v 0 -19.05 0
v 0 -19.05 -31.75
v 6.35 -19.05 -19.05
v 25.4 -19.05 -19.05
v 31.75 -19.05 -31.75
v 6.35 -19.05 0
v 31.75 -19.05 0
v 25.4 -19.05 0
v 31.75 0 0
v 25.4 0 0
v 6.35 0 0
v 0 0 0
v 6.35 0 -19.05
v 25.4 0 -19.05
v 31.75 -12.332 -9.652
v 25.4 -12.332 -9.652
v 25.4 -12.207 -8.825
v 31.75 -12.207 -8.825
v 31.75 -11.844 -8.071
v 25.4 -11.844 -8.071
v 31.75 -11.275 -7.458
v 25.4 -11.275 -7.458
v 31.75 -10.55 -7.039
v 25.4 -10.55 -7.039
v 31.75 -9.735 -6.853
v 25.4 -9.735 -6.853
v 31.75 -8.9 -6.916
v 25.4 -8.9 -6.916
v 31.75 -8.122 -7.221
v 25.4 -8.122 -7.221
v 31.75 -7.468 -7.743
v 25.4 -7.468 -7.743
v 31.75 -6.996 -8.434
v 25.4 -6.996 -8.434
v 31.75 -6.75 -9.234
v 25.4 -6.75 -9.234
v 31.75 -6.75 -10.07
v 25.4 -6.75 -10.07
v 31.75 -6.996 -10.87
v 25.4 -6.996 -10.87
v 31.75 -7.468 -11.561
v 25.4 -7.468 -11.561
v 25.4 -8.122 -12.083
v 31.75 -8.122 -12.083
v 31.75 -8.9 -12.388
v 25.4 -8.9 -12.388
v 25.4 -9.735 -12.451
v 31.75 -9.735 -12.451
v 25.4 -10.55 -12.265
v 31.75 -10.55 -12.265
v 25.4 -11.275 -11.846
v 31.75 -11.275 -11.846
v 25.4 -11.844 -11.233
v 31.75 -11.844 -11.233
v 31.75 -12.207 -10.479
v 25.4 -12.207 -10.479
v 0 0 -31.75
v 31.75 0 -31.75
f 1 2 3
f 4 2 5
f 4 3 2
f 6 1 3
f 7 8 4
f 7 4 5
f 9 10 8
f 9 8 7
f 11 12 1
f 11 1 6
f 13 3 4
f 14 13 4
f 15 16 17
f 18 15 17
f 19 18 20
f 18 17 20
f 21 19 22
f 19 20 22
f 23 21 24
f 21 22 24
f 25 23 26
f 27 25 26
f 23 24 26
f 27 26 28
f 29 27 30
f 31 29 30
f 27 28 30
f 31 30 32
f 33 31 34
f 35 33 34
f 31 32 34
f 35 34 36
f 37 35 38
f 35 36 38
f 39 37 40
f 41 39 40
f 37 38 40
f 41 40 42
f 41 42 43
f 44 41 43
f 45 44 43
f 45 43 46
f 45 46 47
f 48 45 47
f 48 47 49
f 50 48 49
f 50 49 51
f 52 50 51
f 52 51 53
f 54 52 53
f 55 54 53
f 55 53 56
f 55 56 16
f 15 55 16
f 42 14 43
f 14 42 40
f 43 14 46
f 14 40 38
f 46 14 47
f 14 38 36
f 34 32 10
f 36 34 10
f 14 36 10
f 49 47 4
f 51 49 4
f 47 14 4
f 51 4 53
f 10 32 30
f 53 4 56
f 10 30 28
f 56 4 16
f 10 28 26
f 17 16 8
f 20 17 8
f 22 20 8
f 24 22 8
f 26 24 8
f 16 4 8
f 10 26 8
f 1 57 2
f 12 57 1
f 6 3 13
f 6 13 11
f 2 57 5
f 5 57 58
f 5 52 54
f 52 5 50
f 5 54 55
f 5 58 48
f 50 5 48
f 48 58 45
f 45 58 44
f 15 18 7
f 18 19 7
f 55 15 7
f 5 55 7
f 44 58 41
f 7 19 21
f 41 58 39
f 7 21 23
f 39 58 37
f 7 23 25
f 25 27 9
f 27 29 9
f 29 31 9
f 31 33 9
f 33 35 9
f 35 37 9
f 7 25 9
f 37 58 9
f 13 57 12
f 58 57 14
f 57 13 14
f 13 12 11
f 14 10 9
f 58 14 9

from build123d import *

# Parameters (mm, degrees)
F0_W     = 31.75
F0_H     = 31.75
F1_DEPTH = 19.05
F2_W     = 19.05
F2_H     = 19.05
F3_DEPTH = 19.051
F5_D     = 5.6134
F5_DEPTH = 7.62


with BuildPart() as f1:
    # F0 (on Front) → F1 (new body)
    with BuildSketch(Plane.XZ):
        with Locations((15.875, -15.875)):
            Rectangle(F0_W, F0_H)
    extrude(amount=F1_DEPTH)

    # F2 (on face) → F3 (cut, through all)
    with BuildSketch(Plane.XZ.offset(19.05)):
        with Locations((15.875, -9.525)):
            Rectangle(F2_W, F2_H)
    extrude(amount=-F3_DEPTH, mode=Mode.SUBTRACT)

    # F5
    with Locations(Plane.YZ.offset(31.75)):
        with Locations((-9.525, -9.652)):
            Hole(F5_D / 2, depth=F5_DEPTH)


solid = f1.part
